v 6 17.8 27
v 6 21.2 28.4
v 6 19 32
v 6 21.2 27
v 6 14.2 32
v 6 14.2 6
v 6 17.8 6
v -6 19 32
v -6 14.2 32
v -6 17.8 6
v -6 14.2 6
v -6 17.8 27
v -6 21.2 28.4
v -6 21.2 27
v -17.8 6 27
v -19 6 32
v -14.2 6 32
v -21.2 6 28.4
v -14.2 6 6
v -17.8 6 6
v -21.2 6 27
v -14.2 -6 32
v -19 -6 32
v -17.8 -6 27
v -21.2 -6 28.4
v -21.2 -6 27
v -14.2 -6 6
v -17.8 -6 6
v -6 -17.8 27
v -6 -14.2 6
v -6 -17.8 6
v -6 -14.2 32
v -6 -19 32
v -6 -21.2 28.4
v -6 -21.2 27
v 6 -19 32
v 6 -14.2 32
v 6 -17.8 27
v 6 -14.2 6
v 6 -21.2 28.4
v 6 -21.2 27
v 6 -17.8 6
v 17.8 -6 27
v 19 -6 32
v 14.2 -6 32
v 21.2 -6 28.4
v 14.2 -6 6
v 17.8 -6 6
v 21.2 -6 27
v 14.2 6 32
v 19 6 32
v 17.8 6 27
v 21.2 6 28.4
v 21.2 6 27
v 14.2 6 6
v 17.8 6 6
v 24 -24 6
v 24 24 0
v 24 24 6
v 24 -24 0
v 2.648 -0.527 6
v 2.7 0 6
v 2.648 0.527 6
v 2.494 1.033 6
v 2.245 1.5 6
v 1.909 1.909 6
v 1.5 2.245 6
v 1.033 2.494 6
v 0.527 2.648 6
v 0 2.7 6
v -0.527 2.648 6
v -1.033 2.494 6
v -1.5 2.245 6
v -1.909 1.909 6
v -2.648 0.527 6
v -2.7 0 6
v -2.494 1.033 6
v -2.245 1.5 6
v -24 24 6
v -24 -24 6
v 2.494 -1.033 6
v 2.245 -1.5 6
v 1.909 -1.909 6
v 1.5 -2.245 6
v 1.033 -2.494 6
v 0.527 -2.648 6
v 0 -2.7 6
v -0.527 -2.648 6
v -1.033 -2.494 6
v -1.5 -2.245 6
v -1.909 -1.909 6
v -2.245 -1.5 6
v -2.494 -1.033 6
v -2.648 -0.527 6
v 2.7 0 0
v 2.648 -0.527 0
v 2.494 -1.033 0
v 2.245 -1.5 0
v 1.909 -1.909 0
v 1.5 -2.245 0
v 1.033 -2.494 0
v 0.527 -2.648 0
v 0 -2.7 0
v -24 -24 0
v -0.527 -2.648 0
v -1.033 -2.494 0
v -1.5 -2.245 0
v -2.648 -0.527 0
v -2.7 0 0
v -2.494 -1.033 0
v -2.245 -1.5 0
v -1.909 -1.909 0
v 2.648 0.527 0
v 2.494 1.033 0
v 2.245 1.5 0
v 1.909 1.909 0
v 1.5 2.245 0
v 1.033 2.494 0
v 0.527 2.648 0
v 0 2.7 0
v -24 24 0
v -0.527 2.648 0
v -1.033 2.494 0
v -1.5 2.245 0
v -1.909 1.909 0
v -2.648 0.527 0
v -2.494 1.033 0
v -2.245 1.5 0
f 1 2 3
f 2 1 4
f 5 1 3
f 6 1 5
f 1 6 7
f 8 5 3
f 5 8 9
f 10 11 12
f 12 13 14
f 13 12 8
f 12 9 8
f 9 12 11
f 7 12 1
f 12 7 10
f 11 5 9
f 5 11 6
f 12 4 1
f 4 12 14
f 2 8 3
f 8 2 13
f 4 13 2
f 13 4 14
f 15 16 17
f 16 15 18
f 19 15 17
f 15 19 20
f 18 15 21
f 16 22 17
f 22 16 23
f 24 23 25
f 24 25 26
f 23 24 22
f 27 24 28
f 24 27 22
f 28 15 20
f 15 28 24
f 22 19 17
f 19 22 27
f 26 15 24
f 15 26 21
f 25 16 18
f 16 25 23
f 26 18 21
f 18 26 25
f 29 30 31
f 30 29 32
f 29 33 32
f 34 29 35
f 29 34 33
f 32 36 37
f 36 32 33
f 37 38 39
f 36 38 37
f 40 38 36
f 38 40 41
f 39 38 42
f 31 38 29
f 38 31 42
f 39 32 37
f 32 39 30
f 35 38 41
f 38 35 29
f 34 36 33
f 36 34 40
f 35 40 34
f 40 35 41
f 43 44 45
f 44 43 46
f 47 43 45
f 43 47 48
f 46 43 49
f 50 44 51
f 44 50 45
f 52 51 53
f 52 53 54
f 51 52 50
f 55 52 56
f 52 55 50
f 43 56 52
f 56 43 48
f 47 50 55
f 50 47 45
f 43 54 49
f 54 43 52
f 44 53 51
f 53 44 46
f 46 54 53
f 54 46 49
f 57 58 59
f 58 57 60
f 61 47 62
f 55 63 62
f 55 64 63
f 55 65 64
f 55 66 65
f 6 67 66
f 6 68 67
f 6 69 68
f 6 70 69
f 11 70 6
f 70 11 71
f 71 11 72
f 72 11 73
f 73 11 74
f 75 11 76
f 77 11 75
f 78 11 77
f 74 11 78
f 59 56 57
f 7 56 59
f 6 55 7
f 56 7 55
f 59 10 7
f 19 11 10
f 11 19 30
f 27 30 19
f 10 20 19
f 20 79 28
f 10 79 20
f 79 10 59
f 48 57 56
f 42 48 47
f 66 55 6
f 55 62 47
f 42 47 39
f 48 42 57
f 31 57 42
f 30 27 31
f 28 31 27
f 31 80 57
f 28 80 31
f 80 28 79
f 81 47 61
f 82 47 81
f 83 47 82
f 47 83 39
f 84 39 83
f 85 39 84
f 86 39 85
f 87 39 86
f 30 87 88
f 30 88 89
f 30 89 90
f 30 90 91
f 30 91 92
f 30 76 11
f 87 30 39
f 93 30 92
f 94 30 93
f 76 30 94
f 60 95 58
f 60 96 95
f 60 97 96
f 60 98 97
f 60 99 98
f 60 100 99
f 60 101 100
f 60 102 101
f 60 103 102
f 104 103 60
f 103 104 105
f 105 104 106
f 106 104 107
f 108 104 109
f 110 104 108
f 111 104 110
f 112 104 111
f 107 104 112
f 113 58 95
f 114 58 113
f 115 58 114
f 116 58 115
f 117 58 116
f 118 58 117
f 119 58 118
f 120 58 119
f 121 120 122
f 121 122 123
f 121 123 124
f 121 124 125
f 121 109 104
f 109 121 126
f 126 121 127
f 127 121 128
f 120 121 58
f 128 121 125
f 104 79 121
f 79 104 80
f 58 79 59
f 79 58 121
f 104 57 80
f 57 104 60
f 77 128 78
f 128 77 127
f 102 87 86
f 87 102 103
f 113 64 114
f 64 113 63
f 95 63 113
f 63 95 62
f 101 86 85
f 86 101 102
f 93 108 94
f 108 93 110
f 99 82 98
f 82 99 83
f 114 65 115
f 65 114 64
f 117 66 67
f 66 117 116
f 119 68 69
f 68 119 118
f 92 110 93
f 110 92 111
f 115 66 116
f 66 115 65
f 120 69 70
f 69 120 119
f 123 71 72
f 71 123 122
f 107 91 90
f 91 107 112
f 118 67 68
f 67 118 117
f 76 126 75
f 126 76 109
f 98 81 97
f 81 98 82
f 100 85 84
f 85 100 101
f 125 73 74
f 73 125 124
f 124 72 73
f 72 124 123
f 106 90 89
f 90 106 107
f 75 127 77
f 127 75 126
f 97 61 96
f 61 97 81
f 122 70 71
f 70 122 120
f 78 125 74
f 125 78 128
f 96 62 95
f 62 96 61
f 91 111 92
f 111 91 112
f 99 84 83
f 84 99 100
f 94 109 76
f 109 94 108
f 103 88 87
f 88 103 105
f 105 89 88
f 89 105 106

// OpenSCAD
$fn = 32;

// ----------------------------------------------------------------------
// Snap-fit latch: 4 arms, 26 mm tall, 3.6 mm undercut hooks
// ----------------------------------------------------------------------

// --- parameters (mm) ---
base_d = 48;              // base plate depth
base_h = 6;               // base plate thickness
span = 32;                // distance between opposite arms
arm_t = 3.6;              // arm thickness
arm_d = 12;               // arm width
height = 26;              // free arm length
head_len = 3.6;           // hook reach
head_h = 5;               // hook height
lead = 1.4;               // lead-in ramp thickness
bore_d = 5.4;             // base fixing bore
top_z = 32;               // height of the arm tips above the base

arms = 4;

difference() {
  union() {
    /* base plate, centred on the arm ring */
    translate([-24, -24, 0]) cube([base_d, base_d, base_h]);
    for (a = [0 : 360 / arms : 359]) rotate([0, 0, a]) {
    /* arm, sunk 0.5 mm into the base */
    translate([-arm_d / 2, span / 2 - arm_t / 2, base_h - 0.5]) cube([arm_d, arm_t, height + 0.5]);
    /* hook: a convex hull of a tall inner block and a thin outer lip
       gives a flat undercut below and a lead-in ramp on top */
    hull() {
      translate([-arm_d / 2, span / 2 + arm_t / 2 - 0.6, top_z - head_h]) cube([arm_d, lead + 0.4, head_h]);
      translate([-arm_d / 2, span / 2 + arm_t / 2 - 0.2, top_z - head_h]) cube([arm_d, head_len, lead]);
    }
    }
  }
  translate([0, 0, -2.5]) cylinder(h = base_h + 5, d = bore_d);
}
